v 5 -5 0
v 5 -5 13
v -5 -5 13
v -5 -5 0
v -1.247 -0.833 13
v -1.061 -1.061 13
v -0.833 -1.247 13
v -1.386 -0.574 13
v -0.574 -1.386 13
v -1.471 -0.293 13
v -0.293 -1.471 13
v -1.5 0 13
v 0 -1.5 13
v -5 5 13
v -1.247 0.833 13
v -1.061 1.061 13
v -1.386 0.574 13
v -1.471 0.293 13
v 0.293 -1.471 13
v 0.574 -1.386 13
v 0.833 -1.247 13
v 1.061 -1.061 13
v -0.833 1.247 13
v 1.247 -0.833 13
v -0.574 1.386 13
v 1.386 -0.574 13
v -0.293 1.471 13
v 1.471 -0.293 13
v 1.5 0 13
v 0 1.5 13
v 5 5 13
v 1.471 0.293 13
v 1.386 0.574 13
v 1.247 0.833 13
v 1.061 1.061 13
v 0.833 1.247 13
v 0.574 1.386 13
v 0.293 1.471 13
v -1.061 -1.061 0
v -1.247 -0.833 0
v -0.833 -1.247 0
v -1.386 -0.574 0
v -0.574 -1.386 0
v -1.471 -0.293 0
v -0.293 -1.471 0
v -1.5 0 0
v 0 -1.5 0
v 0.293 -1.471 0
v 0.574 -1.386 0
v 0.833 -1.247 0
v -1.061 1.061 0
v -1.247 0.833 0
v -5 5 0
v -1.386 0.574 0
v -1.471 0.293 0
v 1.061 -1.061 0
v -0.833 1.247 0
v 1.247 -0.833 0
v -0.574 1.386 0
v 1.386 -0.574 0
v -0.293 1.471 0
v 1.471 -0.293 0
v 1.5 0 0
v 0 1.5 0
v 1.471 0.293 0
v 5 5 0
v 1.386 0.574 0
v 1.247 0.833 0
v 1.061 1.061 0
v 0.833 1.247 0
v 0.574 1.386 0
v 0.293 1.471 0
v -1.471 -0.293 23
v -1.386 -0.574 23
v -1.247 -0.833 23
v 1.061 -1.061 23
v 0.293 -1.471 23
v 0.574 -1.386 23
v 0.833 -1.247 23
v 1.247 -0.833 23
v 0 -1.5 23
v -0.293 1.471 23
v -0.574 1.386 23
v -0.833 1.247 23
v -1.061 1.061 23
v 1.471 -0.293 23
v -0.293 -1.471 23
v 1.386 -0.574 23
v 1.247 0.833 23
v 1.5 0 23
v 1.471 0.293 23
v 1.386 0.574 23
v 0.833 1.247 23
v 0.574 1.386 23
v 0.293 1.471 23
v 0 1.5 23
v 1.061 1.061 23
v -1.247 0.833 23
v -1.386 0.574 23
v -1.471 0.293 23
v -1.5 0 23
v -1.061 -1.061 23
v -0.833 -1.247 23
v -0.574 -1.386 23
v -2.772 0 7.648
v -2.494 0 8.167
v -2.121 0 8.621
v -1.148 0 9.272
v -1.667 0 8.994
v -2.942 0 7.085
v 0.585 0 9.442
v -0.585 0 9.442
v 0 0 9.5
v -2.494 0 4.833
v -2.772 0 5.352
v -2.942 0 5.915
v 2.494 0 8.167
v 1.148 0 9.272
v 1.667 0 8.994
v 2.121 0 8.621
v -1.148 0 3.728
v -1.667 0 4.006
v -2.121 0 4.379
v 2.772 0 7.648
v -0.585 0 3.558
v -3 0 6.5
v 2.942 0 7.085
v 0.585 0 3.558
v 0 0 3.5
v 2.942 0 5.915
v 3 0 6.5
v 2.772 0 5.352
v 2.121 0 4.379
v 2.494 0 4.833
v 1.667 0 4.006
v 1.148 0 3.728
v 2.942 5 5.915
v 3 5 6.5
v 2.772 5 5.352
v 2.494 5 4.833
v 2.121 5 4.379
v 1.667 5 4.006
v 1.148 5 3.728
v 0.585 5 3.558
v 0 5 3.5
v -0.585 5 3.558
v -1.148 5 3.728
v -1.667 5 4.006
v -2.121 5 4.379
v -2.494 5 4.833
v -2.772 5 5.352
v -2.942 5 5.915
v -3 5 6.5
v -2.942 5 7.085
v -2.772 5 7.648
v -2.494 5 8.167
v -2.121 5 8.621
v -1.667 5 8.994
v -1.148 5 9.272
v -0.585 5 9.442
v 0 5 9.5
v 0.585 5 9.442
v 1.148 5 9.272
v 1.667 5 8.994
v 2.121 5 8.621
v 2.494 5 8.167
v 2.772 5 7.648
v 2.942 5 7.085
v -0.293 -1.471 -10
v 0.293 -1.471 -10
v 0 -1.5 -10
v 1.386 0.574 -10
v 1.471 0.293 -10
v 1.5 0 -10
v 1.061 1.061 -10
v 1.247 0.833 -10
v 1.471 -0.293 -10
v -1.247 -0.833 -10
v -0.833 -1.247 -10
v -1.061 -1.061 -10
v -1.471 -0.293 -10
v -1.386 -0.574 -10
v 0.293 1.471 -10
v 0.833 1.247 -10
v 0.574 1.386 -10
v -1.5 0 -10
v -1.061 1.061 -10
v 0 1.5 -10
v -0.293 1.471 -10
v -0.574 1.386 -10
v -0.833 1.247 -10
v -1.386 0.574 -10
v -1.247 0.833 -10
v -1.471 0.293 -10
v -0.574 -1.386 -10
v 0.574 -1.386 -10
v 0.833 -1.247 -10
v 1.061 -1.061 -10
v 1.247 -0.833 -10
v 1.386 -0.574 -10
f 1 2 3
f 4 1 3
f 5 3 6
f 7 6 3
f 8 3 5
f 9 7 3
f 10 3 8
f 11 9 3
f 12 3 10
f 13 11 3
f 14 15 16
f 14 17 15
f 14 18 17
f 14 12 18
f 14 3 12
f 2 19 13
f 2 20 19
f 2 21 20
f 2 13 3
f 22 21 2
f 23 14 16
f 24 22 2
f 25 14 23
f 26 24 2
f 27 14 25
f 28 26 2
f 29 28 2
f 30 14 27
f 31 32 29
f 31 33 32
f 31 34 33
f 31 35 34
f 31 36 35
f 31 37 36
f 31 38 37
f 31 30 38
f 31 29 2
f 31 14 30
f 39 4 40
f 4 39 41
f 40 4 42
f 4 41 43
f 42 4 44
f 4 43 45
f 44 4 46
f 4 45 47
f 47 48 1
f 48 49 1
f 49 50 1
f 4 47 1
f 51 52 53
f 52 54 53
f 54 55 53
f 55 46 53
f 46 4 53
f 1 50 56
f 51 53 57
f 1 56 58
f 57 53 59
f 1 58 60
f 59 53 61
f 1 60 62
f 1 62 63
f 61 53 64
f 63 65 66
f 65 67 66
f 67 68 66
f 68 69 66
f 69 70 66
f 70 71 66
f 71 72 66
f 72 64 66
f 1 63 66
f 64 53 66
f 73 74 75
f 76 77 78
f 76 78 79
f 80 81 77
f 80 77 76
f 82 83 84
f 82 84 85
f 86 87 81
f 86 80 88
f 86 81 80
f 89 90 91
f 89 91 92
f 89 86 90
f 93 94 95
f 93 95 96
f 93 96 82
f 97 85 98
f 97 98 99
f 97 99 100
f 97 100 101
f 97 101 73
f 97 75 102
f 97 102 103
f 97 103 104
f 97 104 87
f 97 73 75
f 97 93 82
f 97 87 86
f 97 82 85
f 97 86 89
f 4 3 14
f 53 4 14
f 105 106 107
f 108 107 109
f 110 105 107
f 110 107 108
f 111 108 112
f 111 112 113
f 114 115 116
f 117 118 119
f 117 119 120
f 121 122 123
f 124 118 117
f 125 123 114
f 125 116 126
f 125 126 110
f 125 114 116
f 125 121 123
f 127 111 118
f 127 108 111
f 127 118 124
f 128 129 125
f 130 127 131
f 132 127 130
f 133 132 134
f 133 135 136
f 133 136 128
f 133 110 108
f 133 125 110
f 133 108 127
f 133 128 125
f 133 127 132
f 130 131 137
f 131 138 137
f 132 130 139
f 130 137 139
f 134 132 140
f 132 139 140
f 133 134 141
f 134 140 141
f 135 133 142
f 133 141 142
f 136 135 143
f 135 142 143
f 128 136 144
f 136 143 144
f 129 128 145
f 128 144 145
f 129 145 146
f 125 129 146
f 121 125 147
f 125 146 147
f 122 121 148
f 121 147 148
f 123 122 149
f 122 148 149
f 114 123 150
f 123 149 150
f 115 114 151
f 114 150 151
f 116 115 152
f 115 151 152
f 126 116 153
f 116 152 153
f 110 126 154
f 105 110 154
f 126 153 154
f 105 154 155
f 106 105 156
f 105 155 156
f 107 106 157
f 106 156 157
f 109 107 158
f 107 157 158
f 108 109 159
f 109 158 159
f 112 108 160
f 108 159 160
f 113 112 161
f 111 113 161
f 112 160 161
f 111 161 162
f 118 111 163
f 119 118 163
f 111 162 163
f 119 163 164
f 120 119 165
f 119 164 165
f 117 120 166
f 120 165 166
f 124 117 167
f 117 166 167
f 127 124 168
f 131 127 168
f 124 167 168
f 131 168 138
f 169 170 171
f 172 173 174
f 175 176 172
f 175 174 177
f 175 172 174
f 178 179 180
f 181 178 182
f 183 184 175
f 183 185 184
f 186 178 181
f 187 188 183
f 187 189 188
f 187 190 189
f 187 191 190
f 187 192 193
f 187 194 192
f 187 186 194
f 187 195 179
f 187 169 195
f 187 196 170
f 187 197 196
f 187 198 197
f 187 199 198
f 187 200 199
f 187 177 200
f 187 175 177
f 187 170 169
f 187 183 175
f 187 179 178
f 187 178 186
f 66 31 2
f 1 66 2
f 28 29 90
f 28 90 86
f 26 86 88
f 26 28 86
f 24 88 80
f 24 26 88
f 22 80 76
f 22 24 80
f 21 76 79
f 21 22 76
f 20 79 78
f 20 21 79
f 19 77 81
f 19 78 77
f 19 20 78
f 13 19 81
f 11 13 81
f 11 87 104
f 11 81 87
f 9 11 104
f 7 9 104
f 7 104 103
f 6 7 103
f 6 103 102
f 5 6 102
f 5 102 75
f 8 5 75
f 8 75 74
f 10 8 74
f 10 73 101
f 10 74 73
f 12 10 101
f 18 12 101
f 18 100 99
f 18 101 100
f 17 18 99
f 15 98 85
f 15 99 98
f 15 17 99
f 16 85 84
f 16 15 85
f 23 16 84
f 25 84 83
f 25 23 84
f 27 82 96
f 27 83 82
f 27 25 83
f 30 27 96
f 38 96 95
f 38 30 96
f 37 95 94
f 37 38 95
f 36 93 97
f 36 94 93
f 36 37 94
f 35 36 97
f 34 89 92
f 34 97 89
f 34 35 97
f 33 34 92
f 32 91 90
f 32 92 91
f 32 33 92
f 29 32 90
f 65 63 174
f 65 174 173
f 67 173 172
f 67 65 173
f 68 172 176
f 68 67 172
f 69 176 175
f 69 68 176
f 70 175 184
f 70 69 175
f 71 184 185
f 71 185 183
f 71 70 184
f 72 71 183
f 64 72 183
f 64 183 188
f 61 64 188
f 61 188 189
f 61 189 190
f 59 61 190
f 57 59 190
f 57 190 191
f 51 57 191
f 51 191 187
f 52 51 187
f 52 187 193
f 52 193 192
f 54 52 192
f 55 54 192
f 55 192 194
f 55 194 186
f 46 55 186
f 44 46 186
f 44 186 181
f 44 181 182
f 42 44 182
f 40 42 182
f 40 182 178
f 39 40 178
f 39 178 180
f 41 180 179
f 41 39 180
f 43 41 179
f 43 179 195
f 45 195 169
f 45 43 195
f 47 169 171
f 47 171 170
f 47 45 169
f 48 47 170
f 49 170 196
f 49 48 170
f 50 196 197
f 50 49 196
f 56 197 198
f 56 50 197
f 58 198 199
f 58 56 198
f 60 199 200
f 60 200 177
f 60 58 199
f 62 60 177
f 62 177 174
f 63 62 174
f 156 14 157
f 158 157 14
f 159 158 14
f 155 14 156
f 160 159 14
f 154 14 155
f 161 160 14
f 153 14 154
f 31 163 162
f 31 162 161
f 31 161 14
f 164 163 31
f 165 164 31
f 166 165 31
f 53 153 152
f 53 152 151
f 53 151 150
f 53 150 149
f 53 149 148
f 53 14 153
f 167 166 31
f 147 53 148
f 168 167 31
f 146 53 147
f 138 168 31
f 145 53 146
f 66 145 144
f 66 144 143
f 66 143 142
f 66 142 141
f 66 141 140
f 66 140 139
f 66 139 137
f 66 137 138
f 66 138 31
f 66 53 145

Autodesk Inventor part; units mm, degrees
ref_plane "YZ Plane" through (0, 0, 0) normal (1, 0, 0) x (0, 1, 0)
ref_plane "XZ Plane" through (0, 0, 0) normal (0, 1, 0) x (-1, 0, 0)
ref_plane "XY Plane" through (0, 0, 0) normal (0, 0, 1) x (1, 0, 0)
sketch "Sketch1" plane through (0, 0, 0) normal (0, 0, 1) x (1, 0, 0)
  line L0 (-5, 5) -> (5, 5)
  line L1 (5, 5) -> (5, -5)
  line L2 (5, -5) -> (-5, -5)
  line L3 (-5, -5) -> (-5, 5)
  line L4 (-5, 5) -> (5, -5) construction
  line L5 (5, 5) -> (-5, -5) construction
  point P0 (0, 0)
  dimension "d0" = 10
  dimension "d1" = 10
extrude "Extrusion1" add sketch "Sketch1" along normal blind 13
sketch "Sketch2" plane through (0, 0, 13) normal (0, 0, 1) x (1, 0, 0)
  circle A0 centre (0, 0) radius 1.5
  dimension "d4" = 3
extrude "Extrusion2" add sketch "Sketch2" along normal blind 10
ref_plane "Work Plane1" through (0, 0, 6.5) normal (0, 0, 1) x (1, 0, 0)
mirror "Mirror1" about plane through (0, 0, 6.5) normal (0, 0, 1) of "Extrusion2"
sketch "Sketch3" plane through (-5, 5, 0) normal (0, 1, 0) x (1, 0, 0)
  line L0 (0, 0) -> (0, -13) projected
  line L1 (0, -6.5) -> (10, -6.5)
  line L2 (10, 0) -> (10, -13) projected
  circle A0 centre (5, -6.5) radius 3
  point P0 (5, 0)
  dimension "d7" = 6
extrude "Extrusion3" cut sketch "Sketch3" against normal blind 5
properties part number "Claw Connector 1"
